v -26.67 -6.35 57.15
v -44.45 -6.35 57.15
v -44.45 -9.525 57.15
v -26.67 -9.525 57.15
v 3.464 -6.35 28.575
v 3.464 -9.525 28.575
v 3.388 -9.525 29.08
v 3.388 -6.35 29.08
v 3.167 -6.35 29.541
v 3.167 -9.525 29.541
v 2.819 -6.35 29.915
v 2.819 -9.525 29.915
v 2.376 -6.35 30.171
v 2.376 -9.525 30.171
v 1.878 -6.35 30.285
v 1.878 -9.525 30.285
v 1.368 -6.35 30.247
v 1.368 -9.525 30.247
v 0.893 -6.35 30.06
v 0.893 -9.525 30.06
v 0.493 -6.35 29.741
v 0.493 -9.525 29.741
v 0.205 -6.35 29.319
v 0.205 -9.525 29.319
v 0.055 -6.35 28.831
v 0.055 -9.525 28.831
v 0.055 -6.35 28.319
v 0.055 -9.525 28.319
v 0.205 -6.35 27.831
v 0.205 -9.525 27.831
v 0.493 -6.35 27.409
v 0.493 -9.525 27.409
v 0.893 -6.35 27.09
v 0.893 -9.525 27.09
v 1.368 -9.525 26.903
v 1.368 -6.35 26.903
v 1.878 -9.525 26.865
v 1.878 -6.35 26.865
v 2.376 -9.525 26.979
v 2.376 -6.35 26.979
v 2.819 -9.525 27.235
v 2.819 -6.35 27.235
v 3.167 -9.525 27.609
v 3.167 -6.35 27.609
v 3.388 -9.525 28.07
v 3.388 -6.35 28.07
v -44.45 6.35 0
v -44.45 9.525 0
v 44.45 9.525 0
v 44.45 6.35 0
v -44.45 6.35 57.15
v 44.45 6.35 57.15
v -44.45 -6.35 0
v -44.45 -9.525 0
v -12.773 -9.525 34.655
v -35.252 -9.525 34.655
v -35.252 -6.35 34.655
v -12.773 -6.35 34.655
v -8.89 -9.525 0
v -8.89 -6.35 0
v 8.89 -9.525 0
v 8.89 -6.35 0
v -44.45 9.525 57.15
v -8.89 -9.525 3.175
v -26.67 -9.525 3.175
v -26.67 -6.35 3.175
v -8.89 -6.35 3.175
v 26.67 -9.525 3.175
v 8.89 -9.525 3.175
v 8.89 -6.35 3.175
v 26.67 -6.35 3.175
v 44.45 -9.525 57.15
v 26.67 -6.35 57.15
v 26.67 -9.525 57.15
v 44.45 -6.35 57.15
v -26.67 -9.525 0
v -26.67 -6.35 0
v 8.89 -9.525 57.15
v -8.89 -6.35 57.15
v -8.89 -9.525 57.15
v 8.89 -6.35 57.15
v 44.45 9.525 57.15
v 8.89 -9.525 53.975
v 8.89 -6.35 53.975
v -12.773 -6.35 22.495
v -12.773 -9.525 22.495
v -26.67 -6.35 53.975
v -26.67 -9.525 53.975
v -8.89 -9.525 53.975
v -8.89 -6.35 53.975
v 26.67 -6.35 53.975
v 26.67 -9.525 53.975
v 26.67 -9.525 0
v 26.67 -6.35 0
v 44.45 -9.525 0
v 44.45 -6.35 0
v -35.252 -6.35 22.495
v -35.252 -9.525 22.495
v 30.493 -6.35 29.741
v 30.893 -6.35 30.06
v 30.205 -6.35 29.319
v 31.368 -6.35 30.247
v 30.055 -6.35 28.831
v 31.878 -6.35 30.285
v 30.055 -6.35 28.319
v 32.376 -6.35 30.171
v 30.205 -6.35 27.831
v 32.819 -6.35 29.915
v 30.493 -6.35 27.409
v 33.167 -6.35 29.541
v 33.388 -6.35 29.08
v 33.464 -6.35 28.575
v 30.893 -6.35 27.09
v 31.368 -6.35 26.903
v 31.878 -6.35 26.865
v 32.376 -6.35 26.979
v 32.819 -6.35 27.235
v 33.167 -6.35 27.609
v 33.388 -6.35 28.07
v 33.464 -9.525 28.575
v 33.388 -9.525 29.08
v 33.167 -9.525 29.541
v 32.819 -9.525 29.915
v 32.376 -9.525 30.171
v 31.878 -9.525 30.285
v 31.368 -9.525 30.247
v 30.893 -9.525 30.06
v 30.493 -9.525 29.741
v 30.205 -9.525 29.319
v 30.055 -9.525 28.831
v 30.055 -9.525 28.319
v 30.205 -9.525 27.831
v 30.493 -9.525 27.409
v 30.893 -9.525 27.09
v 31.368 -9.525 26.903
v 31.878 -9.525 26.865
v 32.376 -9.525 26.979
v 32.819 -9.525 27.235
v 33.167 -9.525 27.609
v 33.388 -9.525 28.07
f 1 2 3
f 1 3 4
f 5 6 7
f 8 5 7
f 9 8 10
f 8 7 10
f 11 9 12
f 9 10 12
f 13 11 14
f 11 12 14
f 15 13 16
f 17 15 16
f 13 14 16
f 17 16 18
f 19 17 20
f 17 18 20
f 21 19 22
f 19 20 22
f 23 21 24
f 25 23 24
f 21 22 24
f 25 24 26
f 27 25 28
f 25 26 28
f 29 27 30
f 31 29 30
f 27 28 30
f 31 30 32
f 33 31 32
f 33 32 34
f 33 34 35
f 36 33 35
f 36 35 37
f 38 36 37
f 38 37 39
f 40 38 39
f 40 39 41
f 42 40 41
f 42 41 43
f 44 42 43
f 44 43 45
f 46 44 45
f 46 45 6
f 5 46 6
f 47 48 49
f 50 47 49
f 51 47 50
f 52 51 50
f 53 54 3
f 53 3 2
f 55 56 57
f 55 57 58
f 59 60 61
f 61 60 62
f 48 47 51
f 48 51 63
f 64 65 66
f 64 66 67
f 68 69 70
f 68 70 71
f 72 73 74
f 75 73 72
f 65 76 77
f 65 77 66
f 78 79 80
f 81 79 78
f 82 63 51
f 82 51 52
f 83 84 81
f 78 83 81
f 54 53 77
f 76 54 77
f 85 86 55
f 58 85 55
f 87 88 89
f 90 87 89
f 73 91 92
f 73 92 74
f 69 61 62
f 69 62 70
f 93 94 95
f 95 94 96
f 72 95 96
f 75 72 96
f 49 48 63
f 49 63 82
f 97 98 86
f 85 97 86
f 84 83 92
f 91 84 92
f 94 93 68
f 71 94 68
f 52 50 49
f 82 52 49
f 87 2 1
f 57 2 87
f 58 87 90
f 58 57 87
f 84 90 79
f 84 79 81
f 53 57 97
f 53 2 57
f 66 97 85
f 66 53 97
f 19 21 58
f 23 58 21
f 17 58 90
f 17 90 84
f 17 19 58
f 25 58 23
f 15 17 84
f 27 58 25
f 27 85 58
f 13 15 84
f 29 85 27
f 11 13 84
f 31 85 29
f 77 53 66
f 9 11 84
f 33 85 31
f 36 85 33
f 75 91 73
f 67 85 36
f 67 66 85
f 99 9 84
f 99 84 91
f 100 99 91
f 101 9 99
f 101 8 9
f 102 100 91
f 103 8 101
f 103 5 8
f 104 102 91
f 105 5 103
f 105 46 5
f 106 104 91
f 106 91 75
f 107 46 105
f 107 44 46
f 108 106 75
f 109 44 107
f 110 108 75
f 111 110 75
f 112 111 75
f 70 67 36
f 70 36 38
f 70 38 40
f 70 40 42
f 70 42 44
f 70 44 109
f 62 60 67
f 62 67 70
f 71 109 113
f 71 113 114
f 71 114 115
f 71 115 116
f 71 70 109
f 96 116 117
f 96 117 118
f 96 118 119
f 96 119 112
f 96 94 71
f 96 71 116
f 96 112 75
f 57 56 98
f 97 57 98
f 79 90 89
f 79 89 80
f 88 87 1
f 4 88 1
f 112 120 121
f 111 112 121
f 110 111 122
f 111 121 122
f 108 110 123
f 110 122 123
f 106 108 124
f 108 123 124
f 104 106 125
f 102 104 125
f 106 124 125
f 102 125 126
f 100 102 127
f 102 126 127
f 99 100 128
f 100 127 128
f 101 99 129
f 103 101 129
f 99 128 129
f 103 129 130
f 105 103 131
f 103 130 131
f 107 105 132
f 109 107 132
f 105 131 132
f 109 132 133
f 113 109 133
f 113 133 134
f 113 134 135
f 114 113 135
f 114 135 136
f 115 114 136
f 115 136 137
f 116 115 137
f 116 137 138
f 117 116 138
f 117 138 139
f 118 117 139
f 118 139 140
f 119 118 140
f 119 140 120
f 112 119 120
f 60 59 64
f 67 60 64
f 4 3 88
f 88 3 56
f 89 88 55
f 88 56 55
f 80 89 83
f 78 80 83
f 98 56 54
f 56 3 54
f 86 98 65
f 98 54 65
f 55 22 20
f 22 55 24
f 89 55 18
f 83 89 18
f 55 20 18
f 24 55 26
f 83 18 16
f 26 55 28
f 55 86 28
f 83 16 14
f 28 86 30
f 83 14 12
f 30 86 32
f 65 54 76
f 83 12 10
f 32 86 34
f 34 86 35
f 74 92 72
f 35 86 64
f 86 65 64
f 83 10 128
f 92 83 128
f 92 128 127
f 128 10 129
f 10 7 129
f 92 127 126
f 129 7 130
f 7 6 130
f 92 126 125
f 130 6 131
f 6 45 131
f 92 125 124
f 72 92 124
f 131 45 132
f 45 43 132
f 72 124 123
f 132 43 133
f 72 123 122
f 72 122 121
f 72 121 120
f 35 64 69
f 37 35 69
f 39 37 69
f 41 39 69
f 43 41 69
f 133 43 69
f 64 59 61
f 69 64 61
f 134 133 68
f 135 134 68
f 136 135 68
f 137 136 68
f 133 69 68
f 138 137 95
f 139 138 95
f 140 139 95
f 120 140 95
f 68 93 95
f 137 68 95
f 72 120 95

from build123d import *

# Parameters (mm, degrees)
F0_W       = 88.9
F0_H       = 3.175
F1_DEPTH   = 57.15
F2_W       = 17.78
F2_H       = 3.175
F2_W_2     = 22.479
F2_H_2     = 6.080125
F1_FACE1_W = 88.9
F1_FACE1_H = 57.15
F3_DEPTH   = 19.051


with BuildPart() as f1:
    # F0 (on Top) → F1 (new body)
    with BuildSketch(Plane.XY):
        with Locations((0, 7.9375)):
            Rectangle(F0_W, F0_H)
    extrude(amount=F1_DEPTH)


with BuildPart() as f1b:
    # F0 (on Top) → F1, piece 2 (new body)
    with BuildSketch(Plane.XY):
        with Locations((0, -7.9375)):
            Rectangle(F0_W, F0_H)
    extrude(amount=F1_DEPTH)

    # F2 (on face) + F1_face1 (on face) → F3 (cut, through all)
    with BuildSketch(Plane.XZ.offset(9.525)):
        with Locations((-17.78, 55.5625)):
            Rectangle(F2_W, F2_H)
        with Locations((17.78, 55.5625)):
            Rectangle(F2_W, F2_H)
        with Locations((-17.78, 1.5875)):
            Rectangle(F2_W, F2_H)
        with Locations((17.78, 1.5875)):
            Rectangle(F2_W, F2_H)
        with Locations((-24.0125088, 31.6150625)):
            Rectangle(F2_W_2, F2_H_2)
        with Locations((-24.0125088, 25.5349375)):
            Rectangle(F2_W_2, F2_H_2)
        with BuildLine():
            Line((3.4645, 28.575), (0.0355, 28.575))
            ThreePointArc((0.0355, 28.575), (1.75, 26.8605), (3.4645, 28.575))
        make_face()
        with BuildLine():
            ThreePointArc((3.4645, 28.575), (1.75, 30.2895), (0.0355, 28.575))
            Line((0.0355, 28.575), (3.4645, 28.575))
        make_face()
        with BuildLine():
            Line((33.4645, 28.575), (30.0355, 28.575))
            ThreePointArc((30.0355, 28.575), (31.75, 26.8605), (33.4645, 28.575))
        make_face()
        with BuildLine():
            ThreePointArc((33.4645, 28.575), (31.75, 30.2895), (30.0355, 28.575))
            Line((30.0355, 28.575), (33.4645, 28.575))
        make_face()
    with BuildSketch(Plane(origin=(0, -6.35, 28.575), x_dir=(-1, 0, 0), z_dir=(0, 1, 0))):
        Rectangle(F1_FACE1_W, F1_FACE1_H)
    extrude(amount=-F3_DEPTH, dir=(0, -1, 0), mode=Mode.SUBTRACT)


solid = Compound([f1.part, f1b.part])
